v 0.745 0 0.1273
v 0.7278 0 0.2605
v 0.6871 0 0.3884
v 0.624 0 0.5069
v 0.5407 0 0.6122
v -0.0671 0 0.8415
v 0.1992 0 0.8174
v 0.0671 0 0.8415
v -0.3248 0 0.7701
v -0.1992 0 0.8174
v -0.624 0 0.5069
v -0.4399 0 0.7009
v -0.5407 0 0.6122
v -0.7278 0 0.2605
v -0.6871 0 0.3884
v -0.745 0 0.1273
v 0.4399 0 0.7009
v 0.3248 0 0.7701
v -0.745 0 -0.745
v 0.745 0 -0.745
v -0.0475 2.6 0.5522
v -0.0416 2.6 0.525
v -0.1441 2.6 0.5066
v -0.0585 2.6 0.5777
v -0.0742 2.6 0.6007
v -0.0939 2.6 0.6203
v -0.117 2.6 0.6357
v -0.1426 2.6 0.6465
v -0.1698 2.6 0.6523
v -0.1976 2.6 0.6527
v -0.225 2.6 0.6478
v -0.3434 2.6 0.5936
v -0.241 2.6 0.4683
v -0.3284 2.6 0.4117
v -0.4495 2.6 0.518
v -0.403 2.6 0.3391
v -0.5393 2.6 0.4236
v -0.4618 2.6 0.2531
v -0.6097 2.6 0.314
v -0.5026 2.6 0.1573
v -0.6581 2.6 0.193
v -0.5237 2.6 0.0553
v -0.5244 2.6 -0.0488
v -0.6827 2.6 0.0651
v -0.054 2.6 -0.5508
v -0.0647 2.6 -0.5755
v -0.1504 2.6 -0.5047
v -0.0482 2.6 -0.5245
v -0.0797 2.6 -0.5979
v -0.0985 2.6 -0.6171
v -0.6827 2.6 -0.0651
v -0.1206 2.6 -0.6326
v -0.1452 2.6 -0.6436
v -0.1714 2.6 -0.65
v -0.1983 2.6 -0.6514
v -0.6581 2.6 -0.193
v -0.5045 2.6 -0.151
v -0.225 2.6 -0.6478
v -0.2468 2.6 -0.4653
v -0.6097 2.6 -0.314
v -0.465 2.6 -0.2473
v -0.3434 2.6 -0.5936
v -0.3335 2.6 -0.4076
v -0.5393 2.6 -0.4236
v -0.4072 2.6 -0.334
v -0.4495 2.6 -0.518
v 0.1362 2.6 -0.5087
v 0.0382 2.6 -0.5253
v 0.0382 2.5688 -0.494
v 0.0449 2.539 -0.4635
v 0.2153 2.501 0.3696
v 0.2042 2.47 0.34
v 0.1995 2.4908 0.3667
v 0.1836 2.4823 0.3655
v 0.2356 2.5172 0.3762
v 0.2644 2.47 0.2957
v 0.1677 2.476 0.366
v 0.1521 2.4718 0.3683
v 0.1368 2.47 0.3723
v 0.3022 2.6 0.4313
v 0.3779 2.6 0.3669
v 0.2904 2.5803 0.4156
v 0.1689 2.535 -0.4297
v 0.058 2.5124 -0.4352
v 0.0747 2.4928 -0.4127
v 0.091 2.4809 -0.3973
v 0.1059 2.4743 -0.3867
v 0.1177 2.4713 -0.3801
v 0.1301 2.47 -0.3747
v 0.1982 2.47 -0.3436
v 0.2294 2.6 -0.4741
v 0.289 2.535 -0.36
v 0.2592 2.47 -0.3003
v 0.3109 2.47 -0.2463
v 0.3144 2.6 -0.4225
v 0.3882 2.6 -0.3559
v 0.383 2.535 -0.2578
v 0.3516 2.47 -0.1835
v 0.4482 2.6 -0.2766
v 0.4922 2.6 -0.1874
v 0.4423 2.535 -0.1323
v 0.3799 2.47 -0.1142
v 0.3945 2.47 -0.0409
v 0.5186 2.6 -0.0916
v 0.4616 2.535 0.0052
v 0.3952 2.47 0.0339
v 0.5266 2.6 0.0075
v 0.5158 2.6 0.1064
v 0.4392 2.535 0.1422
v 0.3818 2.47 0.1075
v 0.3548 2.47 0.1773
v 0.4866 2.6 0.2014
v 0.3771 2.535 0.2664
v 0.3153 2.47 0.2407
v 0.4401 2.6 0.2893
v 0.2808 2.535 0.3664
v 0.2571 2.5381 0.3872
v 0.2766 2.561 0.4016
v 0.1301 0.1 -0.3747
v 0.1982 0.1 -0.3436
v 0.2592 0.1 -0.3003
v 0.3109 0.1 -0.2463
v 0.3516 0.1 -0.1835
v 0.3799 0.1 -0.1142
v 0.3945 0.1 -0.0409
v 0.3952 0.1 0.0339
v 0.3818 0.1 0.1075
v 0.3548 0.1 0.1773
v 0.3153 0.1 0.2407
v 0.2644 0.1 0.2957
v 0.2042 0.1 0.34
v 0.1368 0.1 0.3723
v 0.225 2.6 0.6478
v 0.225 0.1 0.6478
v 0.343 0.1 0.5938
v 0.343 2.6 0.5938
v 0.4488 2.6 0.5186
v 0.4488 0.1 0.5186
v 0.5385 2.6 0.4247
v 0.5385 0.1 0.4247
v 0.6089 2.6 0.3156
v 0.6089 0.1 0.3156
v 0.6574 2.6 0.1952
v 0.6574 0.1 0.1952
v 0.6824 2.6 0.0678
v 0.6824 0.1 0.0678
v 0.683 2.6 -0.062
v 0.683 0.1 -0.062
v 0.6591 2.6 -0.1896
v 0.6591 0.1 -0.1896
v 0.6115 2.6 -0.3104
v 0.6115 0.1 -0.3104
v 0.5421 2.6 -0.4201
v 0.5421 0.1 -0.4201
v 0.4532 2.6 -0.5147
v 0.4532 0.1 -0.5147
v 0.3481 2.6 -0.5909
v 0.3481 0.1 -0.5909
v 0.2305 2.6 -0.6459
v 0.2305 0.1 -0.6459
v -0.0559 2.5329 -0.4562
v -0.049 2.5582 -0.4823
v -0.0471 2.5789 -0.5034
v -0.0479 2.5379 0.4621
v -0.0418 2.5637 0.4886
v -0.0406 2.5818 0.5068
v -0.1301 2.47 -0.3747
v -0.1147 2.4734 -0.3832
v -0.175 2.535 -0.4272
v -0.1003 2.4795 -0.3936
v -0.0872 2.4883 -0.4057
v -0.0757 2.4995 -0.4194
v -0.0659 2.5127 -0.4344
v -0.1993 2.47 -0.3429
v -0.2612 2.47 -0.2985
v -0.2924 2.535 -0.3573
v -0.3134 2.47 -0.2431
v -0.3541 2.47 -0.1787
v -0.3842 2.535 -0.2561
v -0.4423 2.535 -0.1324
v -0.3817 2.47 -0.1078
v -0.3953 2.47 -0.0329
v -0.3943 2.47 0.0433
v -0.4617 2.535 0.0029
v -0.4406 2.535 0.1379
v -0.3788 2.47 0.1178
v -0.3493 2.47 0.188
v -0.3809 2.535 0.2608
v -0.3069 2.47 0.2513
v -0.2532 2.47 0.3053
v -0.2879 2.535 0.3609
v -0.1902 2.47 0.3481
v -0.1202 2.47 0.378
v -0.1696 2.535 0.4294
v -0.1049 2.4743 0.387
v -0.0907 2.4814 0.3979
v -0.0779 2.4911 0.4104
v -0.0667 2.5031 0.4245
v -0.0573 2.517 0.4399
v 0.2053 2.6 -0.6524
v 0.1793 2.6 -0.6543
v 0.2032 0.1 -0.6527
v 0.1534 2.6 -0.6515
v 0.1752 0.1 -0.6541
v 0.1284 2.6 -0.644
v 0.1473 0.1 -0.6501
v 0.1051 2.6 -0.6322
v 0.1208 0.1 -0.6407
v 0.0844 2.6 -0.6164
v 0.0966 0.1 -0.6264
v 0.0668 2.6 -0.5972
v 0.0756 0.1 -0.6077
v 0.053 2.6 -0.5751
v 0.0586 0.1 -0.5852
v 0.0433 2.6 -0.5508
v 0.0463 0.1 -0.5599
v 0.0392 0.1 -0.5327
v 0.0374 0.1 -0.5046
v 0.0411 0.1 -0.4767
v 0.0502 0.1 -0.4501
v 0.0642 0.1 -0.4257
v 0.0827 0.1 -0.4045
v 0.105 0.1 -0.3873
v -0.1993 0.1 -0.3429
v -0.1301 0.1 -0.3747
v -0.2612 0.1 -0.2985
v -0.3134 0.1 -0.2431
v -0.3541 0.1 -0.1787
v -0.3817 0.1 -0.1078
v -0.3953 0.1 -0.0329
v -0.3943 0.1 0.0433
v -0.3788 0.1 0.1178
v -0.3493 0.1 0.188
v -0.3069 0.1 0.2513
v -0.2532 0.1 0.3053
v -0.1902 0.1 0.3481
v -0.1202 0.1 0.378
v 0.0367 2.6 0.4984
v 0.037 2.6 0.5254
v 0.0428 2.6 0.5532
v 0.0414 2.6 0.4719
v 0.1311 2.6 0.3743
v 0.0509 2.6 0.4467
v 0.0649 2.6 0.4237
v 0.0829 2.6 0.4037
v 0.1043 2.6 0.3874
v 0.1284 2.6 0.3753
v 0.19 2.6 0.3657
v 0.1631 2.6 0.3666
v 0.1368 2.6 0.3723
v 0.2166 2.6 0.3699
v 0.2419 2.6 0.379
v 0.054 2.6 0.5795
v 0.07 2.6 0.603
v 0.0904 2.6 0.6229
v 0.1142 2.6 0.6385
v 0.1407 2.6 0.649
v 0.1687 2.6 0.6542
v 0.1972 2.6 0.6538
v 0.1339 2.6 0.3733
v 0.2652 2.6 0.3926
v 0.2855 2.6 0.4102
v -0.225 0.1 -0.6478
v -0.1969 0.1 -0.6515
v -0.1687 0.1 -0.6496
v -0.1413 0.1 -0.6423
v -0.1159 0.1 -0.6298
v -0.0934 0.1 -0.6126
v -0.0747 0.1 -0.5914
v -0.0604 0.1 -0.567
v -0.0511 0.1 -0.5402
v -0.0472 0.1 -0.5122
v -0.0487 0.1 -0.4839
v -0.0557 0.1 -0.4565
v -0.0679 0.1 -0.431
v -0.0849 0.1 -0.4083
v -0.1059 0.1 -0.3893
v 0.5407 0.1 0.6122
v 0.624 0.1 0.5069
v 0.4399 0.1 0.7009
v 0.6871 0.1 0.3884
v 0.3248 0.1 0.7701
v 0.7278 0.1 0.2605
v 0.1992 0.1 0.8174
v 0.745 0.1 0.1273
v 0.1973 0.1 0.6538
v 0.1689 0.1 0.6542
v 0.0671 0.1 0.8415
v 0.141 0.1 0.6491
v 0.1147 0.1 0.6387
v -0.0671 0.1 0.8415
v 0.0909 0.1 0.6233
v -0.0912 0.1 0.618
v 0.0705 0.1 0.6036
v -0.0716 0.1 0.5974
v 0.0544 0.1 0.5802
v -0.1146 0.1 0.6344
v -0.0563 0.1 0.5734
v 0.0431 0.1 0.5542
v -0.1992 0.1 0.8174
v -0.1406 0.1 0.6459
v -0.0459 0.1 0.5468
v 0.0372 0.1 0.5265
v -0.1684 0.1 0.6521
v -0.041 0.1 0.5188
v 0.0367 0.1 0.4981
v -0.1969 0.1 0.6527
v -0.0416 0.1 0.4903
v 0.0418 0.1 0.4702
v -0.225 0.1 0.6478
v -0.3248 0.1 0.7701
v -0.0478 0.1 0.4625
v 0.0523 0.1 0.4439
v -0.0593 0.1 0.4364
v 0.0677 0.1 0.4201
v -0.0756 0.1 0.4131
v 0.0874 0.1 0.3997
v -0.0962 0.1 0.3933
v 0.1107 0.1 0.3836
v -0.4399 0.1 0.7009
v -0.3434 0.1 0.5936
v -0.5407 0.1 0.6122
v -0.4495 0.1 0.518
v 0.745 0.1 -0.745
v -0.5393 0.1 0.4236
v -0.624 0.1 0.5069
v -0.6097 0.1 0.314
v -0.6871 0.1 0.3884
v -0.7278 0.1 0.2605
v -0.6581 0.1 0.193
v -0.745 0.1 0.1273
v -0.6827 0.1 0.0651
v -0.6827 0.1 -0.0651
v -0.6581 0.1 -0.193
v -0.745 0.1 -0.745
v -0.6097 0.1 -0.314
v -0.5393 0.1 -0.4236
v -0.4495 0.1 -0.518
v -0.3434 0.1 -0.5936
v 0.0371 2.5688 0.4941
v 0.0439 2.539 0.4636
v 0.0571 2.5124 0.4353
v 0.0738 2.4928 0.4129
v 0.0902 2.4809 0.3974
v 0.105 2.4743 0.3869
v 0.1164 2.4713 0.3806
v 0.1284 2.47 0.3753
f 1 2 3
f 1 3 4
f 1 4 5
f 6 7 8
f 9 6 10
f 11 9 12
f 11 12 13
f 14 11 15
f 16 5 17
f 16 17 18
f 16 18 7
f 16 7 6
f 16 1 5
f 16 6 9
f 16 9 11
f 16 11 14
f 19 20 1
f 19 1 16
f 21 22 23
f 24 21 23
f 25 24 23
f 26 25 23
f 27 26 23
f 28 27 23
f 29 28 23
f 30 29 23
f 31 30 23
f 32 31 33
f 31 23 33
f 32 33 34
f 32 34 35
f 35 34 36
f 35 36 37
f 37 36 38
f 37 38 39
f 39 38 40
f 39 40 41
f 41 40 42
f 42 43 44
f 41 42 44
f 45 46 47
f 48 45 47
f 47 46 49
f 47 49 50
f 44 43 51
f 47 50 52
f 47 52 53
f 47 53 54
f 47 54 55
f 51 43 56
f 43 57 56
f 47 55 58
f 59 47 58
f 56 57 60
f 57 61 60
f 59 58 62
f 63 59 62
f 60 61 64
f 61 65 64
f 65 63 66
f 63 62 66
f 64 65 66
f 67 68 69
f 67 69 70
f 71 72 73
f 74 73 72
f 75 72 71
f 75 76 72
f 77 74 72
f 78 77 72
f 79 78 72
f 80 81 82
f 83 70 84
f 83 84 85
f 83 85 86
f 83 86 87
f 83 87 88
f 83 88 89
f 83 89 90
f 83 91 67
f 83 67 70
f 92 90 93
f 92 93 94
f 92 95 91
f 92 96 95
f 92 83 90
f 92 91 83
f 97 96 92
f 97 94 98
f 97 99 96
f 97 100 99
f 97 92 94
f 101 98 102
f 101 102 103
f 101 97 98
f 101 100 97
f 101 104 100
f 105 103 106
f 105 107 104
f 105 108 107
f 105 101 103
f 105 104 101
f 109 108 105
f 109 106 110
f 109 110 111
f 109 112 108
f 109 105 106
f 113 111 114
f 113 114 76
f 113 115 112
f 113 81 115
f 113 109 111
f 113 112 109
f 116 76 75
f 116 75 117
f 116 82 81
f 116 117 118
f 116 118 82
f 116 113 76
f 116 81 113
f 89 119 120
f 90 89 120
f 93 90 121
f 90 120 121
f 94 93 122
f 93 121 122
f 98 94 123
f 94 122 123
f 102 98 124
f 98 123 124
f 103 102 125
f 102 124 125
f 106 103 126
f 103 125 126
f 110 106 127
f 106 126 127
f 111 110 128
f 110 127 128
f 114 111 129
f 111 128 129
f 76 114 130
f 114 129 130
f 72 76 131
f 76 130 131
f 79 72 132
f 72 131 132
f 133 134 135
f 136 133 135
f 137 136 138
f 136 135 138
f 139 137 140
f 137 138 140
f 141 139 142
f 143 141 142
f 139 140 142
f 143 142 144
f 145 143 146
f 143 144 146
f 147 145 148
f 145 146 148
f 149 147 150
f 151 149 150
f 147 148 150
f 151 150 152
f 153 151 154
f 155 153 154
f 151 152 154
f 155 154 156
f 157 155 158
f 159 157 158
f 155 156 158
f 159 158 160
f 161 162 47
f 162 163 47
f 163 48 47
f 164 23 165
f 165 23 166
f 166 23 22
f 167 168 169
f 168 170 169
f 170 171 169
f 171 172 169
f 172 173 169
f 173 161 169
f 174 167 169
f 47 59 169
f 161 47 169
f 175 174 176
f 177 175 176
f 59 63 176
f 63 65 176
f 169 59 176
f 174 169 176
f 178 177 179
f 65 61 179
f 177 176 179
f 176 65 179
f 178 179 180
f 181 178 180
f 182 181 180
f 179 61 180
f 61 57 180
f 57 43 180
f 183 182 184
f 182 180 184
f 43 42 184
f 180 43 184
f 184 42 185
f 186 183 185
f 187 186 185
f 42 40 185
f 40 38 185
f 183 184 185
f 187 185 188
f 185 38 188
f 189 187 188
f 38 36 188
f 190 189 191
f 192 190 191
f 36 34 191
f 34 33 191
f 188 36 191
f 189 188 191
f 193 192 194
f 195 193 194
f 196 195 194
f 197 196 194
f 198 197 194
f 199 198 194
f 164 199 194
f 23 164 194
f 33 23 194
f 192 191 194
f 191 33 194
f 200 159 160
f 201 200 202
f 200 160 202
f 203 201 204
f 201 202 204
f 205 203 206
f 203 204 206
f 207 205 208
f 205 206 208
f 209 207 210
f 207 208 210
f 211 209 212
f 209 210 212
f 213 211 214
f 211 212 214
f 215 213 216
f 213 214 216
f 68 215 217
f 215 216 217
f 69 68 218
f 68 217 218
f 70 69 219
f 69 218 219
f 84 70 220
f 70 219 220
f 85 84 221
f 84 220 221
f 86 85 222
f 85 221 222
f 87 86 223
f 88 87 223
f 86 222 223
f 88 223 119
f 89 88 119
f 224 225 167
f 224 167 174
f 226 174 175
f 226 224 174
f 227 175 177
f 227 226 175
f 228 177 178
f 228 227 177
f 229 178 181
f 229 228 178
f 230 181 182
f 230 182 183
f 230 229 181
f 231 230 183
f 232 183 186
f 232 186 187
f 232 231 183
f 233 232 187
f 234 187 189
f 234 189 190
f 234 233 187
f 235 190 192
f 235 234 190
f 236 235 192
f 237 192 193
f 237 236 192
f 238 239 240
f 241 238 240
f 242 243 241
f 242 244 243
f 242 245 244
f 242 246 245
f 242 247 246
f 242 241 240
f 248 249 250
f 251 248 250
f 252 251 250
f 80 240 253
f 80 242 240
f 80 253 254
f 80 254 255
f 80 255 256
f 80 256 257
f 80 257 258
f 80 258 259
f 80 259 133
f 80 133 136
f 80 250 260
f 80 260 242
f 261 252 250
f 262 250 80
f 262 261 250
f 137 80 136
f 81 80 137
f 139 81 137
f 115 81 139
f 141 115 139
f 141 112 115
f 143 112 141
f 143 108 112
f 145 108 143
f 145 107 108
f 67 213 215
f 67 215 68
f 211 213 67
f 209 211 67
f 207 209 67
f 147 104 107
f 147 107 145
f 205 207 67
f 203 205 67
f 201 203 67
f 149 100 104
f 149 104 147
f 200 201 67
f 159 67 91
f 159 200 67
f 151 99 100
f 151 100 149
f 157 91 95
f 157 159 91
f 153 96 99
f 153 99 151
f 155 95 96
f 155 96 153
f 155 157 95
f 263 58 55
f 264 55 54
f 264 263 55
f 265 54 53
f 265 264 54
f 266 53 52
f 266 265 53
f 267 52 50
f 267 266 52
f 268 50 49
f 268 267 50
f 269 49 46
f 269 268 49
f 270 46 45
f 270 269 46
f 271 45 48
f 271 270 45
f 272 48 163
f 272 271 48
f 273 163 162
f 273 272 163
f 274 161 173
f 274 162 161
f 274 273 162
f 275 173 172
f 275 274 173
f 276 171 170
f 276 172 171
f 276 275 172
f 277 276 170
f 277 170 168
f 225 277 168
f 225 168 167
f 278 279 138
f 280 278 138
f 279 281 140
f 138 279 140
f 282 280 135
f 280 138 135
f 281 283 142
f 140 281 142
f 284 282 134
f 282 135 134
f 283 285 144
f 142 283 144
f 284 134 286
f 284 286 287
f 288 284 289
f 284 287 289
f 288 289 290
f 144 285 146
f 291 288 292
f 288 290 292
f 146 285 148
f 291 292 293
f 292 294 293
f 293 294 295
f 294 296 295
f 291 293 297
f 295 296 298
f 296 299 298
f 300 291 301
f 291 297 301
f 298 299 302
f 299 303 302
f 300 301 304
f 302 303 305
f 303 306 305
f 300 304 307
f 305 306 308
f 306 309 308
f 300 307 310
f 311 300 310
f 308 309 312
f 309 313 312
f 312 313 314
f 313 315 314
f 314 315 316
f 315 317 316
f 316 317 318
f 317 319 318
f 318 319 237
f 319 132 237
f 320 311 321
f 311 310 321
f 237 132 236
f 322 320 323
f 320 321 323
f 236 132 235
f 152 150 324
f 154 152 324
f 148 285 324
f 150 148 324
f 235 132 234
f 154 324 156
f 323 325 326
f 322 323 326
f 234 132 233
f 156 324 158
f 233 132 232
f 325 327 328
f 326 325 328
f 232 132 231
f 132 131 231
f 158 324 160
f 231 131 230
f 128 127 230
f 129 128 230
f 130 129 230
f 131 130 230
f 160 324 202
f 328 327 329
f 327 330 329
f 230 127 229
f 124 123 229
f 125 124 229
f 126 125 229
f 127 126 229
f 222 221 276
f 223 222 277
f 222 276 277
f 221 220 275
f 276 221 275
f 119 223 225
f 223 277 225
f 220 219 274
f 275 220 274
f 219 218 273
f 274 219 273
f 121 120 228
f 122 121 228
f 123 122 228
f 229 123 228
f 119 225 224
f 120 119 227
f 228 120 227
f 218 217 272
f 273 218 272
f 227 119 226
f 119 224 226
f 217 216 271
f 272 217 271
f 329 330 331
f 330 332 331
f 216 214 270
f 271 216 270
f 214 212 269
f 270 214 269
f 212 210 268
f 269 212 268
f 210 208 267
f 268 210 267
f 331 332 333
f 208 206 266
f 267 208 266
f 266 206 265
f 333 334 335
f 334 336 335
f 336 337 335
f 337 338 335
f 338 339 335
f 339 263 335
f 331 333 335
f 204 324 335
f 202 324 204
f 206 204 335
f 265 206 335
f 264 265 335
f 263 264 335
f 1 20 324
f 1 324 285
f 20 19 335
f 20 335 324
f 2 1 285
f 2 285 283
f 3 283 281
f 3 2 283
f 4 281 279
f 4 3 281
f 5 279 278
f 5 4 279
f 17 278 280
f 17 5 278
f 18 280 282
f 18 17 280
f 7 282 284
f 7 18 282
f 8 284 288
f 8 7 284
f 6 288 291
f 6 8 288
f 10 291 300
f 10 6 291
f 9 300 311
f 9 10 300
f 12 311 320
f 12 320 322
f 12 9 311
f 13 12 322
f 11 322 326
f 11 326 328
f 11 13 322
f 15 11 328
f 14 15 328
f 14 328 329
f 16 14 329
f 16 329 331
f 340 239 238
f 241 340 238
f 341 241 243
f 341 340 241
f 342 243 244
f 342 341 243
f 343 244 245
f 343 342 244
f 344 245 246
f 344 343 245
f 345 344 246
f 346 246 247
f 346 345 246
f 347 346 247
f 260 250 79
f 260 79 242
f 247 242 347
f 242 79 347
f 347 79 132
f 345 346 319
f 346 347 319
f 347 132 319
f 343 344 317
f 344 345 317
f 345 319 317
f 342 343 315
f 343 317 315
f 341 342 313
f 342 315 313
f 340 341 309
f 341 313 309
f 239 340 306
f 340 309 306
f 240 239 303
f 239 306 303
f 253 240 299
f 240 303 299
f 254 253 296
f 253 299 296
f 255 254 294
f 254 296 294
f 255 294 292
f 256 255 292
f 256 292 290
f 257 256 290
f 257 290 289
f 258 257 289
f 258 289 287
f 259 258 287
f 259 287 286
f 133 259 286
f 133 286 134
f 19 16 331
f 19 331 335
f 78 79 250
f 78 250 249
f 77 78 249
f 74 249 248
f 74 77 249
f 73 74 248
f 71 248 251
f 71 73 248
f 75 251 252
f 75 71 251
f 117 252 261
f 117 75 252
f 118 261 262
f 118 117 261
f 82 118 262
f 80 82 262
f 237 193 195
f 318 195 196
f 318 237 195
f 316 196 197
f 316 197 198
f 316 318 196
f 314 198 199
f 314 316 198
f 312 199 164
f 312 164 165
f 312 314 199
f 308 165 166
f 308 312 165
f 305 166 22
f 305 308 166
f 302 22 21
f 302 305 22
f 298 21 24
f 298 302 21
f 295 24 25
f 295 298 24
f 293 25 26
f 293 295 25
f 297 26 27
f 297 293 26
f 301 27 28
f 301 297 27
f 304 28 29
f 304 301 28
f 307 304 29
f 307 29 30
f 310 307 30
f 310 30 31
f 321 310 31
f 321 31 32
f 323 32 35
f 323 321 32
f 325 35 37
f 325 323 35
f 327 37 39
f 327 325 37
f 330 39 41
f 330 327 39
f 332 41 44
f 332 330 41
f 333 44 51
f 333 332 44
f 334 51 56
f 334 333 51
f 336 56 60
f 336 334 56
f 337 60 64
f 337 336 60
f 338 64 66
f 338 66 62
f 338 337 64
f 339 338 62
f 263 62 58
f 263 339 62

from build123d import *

# Parameters (mm, degrees)
RESSALTO_EXTRUS_O2_DEPTH = 0.1
RESSALTO_EXTRUS_O4_DEPTH = 2.5
CHANFRO4_SIZE            = 0.13
CHANFRO6_SIZE            = 0.13


with BuildPart() as part:
    # Esboço1 → Ressalto-extrusão2 (new body)
    with BuildSketch(Plane(origin=(0, 0, 0), x_dir=(1, 0, 0), z_dir=(0, 1, 0))):
        with BuildLine():
            Line((-0.745, -0.127313197), (-0.745, 0.745))
            Line((-0.745, 0.745), (0.745, 0.745))
            Line((0.745, 0.745), (0.745, -0.127313197))
            ThreePointArc((0.745, -0.127313197), (0, -0.84454219), (-0.745, -0.127313197))
        make_face()
    extrude(amount=RESSALTO_EXTRUS_O2_DEPTH)

    # Esboço2 → Ressalto-extrusão4 (add)
    with BuildSketch(Plane(origin=(0, 0.1, 0), x_dir=(1, 0, 0), z_dir=(0, 1, 0))):
        with BuildLine():
            ThreePointArc((-0.130138985, 0.374707495), (-0.396628803, -0.005239731), (-0.120195023, -0.378014575))
            ThreePointArc((-0.120195023, -0.378014575), (-0.050453859, -0.560369913), (-0.225, -0.64783959))
            ThreePointArc((-0.225, -0.64783959), (-0.685799631, 0), (-0.225, 0.64783959))
            ThreePointArc((-0.225, 0.64783959), (-0.055075167, 0.553816826), (-0.130138985, 0.374707495))
        make_face()
        with BuildLine():
            ThreePointArc((0.225, -0.64783959), (0.685793341, -0.00293739), (0.230541296, 0.645888415))
            ThreePointArc((0.230541296, 0.645888415), (0.046333691, 0.559912645), (0.130138985, 0.374707495))
            ThreePointArc((0.130138985, 0.374707495), (0.396647844, 0.00351428), (0.136757813, -0.372342803))
            ThreePointArc((0.136757813, -0.372342803), (0.043130513, -0.55421229), (0.225, -0.64783959))
        make_face()
    extrude(amount=RESSALTO_EXTRUS_O4_DEPTH)

    # Chanfro4
    chanfro4_edges = [part.edges().sort_by_distance(p)[0] for p in [
        (-0.396628803, 2.6, 0.005239731),
    ]]
    chamfer(chanfro4_edges, length=CHANFRO4_SIZE)

    # Chanfro6
    # the kernel refuses this chamfer: 0.13 mm, written as the material it takes off along each edge
    with BuildSketch(Plane(origin=(0, 2.6, 0), x_dir=(-0.4876362186378299, 0, -0.8730469164212188), z_dir=(-0.8730469164212188, 0, 0.4876362186378299))) as chanfro6_piece_1_section:
        Polygon((0.396663412, CHANFRO6_SIZE), (0.396663412 + CHANFRO6_SIZE, 0), (0.396663412, 0), align=None)
    chanfro6_piece_1 = revolve(axis=Axis((0, 2.6, 0), (0, -1, 0)), revolution_arc=237.355421361, mode=Mode.PRIVATE)
    chanfro6_piece_1 = chanfro6_piece_1 - Plane(origin=(0.180878906, 2.562353294, 0.510091196), x_dir=(-0.3050366551296925, 0, -0.9523406108253964), z_dir=(0, -1, 0)) * Cylinder(0.14464194, 3, mode=Mode.PRIVATE)
    add(chanfro6_piece_1, mode=Mode.SUBTRACT)


solid = part.part
